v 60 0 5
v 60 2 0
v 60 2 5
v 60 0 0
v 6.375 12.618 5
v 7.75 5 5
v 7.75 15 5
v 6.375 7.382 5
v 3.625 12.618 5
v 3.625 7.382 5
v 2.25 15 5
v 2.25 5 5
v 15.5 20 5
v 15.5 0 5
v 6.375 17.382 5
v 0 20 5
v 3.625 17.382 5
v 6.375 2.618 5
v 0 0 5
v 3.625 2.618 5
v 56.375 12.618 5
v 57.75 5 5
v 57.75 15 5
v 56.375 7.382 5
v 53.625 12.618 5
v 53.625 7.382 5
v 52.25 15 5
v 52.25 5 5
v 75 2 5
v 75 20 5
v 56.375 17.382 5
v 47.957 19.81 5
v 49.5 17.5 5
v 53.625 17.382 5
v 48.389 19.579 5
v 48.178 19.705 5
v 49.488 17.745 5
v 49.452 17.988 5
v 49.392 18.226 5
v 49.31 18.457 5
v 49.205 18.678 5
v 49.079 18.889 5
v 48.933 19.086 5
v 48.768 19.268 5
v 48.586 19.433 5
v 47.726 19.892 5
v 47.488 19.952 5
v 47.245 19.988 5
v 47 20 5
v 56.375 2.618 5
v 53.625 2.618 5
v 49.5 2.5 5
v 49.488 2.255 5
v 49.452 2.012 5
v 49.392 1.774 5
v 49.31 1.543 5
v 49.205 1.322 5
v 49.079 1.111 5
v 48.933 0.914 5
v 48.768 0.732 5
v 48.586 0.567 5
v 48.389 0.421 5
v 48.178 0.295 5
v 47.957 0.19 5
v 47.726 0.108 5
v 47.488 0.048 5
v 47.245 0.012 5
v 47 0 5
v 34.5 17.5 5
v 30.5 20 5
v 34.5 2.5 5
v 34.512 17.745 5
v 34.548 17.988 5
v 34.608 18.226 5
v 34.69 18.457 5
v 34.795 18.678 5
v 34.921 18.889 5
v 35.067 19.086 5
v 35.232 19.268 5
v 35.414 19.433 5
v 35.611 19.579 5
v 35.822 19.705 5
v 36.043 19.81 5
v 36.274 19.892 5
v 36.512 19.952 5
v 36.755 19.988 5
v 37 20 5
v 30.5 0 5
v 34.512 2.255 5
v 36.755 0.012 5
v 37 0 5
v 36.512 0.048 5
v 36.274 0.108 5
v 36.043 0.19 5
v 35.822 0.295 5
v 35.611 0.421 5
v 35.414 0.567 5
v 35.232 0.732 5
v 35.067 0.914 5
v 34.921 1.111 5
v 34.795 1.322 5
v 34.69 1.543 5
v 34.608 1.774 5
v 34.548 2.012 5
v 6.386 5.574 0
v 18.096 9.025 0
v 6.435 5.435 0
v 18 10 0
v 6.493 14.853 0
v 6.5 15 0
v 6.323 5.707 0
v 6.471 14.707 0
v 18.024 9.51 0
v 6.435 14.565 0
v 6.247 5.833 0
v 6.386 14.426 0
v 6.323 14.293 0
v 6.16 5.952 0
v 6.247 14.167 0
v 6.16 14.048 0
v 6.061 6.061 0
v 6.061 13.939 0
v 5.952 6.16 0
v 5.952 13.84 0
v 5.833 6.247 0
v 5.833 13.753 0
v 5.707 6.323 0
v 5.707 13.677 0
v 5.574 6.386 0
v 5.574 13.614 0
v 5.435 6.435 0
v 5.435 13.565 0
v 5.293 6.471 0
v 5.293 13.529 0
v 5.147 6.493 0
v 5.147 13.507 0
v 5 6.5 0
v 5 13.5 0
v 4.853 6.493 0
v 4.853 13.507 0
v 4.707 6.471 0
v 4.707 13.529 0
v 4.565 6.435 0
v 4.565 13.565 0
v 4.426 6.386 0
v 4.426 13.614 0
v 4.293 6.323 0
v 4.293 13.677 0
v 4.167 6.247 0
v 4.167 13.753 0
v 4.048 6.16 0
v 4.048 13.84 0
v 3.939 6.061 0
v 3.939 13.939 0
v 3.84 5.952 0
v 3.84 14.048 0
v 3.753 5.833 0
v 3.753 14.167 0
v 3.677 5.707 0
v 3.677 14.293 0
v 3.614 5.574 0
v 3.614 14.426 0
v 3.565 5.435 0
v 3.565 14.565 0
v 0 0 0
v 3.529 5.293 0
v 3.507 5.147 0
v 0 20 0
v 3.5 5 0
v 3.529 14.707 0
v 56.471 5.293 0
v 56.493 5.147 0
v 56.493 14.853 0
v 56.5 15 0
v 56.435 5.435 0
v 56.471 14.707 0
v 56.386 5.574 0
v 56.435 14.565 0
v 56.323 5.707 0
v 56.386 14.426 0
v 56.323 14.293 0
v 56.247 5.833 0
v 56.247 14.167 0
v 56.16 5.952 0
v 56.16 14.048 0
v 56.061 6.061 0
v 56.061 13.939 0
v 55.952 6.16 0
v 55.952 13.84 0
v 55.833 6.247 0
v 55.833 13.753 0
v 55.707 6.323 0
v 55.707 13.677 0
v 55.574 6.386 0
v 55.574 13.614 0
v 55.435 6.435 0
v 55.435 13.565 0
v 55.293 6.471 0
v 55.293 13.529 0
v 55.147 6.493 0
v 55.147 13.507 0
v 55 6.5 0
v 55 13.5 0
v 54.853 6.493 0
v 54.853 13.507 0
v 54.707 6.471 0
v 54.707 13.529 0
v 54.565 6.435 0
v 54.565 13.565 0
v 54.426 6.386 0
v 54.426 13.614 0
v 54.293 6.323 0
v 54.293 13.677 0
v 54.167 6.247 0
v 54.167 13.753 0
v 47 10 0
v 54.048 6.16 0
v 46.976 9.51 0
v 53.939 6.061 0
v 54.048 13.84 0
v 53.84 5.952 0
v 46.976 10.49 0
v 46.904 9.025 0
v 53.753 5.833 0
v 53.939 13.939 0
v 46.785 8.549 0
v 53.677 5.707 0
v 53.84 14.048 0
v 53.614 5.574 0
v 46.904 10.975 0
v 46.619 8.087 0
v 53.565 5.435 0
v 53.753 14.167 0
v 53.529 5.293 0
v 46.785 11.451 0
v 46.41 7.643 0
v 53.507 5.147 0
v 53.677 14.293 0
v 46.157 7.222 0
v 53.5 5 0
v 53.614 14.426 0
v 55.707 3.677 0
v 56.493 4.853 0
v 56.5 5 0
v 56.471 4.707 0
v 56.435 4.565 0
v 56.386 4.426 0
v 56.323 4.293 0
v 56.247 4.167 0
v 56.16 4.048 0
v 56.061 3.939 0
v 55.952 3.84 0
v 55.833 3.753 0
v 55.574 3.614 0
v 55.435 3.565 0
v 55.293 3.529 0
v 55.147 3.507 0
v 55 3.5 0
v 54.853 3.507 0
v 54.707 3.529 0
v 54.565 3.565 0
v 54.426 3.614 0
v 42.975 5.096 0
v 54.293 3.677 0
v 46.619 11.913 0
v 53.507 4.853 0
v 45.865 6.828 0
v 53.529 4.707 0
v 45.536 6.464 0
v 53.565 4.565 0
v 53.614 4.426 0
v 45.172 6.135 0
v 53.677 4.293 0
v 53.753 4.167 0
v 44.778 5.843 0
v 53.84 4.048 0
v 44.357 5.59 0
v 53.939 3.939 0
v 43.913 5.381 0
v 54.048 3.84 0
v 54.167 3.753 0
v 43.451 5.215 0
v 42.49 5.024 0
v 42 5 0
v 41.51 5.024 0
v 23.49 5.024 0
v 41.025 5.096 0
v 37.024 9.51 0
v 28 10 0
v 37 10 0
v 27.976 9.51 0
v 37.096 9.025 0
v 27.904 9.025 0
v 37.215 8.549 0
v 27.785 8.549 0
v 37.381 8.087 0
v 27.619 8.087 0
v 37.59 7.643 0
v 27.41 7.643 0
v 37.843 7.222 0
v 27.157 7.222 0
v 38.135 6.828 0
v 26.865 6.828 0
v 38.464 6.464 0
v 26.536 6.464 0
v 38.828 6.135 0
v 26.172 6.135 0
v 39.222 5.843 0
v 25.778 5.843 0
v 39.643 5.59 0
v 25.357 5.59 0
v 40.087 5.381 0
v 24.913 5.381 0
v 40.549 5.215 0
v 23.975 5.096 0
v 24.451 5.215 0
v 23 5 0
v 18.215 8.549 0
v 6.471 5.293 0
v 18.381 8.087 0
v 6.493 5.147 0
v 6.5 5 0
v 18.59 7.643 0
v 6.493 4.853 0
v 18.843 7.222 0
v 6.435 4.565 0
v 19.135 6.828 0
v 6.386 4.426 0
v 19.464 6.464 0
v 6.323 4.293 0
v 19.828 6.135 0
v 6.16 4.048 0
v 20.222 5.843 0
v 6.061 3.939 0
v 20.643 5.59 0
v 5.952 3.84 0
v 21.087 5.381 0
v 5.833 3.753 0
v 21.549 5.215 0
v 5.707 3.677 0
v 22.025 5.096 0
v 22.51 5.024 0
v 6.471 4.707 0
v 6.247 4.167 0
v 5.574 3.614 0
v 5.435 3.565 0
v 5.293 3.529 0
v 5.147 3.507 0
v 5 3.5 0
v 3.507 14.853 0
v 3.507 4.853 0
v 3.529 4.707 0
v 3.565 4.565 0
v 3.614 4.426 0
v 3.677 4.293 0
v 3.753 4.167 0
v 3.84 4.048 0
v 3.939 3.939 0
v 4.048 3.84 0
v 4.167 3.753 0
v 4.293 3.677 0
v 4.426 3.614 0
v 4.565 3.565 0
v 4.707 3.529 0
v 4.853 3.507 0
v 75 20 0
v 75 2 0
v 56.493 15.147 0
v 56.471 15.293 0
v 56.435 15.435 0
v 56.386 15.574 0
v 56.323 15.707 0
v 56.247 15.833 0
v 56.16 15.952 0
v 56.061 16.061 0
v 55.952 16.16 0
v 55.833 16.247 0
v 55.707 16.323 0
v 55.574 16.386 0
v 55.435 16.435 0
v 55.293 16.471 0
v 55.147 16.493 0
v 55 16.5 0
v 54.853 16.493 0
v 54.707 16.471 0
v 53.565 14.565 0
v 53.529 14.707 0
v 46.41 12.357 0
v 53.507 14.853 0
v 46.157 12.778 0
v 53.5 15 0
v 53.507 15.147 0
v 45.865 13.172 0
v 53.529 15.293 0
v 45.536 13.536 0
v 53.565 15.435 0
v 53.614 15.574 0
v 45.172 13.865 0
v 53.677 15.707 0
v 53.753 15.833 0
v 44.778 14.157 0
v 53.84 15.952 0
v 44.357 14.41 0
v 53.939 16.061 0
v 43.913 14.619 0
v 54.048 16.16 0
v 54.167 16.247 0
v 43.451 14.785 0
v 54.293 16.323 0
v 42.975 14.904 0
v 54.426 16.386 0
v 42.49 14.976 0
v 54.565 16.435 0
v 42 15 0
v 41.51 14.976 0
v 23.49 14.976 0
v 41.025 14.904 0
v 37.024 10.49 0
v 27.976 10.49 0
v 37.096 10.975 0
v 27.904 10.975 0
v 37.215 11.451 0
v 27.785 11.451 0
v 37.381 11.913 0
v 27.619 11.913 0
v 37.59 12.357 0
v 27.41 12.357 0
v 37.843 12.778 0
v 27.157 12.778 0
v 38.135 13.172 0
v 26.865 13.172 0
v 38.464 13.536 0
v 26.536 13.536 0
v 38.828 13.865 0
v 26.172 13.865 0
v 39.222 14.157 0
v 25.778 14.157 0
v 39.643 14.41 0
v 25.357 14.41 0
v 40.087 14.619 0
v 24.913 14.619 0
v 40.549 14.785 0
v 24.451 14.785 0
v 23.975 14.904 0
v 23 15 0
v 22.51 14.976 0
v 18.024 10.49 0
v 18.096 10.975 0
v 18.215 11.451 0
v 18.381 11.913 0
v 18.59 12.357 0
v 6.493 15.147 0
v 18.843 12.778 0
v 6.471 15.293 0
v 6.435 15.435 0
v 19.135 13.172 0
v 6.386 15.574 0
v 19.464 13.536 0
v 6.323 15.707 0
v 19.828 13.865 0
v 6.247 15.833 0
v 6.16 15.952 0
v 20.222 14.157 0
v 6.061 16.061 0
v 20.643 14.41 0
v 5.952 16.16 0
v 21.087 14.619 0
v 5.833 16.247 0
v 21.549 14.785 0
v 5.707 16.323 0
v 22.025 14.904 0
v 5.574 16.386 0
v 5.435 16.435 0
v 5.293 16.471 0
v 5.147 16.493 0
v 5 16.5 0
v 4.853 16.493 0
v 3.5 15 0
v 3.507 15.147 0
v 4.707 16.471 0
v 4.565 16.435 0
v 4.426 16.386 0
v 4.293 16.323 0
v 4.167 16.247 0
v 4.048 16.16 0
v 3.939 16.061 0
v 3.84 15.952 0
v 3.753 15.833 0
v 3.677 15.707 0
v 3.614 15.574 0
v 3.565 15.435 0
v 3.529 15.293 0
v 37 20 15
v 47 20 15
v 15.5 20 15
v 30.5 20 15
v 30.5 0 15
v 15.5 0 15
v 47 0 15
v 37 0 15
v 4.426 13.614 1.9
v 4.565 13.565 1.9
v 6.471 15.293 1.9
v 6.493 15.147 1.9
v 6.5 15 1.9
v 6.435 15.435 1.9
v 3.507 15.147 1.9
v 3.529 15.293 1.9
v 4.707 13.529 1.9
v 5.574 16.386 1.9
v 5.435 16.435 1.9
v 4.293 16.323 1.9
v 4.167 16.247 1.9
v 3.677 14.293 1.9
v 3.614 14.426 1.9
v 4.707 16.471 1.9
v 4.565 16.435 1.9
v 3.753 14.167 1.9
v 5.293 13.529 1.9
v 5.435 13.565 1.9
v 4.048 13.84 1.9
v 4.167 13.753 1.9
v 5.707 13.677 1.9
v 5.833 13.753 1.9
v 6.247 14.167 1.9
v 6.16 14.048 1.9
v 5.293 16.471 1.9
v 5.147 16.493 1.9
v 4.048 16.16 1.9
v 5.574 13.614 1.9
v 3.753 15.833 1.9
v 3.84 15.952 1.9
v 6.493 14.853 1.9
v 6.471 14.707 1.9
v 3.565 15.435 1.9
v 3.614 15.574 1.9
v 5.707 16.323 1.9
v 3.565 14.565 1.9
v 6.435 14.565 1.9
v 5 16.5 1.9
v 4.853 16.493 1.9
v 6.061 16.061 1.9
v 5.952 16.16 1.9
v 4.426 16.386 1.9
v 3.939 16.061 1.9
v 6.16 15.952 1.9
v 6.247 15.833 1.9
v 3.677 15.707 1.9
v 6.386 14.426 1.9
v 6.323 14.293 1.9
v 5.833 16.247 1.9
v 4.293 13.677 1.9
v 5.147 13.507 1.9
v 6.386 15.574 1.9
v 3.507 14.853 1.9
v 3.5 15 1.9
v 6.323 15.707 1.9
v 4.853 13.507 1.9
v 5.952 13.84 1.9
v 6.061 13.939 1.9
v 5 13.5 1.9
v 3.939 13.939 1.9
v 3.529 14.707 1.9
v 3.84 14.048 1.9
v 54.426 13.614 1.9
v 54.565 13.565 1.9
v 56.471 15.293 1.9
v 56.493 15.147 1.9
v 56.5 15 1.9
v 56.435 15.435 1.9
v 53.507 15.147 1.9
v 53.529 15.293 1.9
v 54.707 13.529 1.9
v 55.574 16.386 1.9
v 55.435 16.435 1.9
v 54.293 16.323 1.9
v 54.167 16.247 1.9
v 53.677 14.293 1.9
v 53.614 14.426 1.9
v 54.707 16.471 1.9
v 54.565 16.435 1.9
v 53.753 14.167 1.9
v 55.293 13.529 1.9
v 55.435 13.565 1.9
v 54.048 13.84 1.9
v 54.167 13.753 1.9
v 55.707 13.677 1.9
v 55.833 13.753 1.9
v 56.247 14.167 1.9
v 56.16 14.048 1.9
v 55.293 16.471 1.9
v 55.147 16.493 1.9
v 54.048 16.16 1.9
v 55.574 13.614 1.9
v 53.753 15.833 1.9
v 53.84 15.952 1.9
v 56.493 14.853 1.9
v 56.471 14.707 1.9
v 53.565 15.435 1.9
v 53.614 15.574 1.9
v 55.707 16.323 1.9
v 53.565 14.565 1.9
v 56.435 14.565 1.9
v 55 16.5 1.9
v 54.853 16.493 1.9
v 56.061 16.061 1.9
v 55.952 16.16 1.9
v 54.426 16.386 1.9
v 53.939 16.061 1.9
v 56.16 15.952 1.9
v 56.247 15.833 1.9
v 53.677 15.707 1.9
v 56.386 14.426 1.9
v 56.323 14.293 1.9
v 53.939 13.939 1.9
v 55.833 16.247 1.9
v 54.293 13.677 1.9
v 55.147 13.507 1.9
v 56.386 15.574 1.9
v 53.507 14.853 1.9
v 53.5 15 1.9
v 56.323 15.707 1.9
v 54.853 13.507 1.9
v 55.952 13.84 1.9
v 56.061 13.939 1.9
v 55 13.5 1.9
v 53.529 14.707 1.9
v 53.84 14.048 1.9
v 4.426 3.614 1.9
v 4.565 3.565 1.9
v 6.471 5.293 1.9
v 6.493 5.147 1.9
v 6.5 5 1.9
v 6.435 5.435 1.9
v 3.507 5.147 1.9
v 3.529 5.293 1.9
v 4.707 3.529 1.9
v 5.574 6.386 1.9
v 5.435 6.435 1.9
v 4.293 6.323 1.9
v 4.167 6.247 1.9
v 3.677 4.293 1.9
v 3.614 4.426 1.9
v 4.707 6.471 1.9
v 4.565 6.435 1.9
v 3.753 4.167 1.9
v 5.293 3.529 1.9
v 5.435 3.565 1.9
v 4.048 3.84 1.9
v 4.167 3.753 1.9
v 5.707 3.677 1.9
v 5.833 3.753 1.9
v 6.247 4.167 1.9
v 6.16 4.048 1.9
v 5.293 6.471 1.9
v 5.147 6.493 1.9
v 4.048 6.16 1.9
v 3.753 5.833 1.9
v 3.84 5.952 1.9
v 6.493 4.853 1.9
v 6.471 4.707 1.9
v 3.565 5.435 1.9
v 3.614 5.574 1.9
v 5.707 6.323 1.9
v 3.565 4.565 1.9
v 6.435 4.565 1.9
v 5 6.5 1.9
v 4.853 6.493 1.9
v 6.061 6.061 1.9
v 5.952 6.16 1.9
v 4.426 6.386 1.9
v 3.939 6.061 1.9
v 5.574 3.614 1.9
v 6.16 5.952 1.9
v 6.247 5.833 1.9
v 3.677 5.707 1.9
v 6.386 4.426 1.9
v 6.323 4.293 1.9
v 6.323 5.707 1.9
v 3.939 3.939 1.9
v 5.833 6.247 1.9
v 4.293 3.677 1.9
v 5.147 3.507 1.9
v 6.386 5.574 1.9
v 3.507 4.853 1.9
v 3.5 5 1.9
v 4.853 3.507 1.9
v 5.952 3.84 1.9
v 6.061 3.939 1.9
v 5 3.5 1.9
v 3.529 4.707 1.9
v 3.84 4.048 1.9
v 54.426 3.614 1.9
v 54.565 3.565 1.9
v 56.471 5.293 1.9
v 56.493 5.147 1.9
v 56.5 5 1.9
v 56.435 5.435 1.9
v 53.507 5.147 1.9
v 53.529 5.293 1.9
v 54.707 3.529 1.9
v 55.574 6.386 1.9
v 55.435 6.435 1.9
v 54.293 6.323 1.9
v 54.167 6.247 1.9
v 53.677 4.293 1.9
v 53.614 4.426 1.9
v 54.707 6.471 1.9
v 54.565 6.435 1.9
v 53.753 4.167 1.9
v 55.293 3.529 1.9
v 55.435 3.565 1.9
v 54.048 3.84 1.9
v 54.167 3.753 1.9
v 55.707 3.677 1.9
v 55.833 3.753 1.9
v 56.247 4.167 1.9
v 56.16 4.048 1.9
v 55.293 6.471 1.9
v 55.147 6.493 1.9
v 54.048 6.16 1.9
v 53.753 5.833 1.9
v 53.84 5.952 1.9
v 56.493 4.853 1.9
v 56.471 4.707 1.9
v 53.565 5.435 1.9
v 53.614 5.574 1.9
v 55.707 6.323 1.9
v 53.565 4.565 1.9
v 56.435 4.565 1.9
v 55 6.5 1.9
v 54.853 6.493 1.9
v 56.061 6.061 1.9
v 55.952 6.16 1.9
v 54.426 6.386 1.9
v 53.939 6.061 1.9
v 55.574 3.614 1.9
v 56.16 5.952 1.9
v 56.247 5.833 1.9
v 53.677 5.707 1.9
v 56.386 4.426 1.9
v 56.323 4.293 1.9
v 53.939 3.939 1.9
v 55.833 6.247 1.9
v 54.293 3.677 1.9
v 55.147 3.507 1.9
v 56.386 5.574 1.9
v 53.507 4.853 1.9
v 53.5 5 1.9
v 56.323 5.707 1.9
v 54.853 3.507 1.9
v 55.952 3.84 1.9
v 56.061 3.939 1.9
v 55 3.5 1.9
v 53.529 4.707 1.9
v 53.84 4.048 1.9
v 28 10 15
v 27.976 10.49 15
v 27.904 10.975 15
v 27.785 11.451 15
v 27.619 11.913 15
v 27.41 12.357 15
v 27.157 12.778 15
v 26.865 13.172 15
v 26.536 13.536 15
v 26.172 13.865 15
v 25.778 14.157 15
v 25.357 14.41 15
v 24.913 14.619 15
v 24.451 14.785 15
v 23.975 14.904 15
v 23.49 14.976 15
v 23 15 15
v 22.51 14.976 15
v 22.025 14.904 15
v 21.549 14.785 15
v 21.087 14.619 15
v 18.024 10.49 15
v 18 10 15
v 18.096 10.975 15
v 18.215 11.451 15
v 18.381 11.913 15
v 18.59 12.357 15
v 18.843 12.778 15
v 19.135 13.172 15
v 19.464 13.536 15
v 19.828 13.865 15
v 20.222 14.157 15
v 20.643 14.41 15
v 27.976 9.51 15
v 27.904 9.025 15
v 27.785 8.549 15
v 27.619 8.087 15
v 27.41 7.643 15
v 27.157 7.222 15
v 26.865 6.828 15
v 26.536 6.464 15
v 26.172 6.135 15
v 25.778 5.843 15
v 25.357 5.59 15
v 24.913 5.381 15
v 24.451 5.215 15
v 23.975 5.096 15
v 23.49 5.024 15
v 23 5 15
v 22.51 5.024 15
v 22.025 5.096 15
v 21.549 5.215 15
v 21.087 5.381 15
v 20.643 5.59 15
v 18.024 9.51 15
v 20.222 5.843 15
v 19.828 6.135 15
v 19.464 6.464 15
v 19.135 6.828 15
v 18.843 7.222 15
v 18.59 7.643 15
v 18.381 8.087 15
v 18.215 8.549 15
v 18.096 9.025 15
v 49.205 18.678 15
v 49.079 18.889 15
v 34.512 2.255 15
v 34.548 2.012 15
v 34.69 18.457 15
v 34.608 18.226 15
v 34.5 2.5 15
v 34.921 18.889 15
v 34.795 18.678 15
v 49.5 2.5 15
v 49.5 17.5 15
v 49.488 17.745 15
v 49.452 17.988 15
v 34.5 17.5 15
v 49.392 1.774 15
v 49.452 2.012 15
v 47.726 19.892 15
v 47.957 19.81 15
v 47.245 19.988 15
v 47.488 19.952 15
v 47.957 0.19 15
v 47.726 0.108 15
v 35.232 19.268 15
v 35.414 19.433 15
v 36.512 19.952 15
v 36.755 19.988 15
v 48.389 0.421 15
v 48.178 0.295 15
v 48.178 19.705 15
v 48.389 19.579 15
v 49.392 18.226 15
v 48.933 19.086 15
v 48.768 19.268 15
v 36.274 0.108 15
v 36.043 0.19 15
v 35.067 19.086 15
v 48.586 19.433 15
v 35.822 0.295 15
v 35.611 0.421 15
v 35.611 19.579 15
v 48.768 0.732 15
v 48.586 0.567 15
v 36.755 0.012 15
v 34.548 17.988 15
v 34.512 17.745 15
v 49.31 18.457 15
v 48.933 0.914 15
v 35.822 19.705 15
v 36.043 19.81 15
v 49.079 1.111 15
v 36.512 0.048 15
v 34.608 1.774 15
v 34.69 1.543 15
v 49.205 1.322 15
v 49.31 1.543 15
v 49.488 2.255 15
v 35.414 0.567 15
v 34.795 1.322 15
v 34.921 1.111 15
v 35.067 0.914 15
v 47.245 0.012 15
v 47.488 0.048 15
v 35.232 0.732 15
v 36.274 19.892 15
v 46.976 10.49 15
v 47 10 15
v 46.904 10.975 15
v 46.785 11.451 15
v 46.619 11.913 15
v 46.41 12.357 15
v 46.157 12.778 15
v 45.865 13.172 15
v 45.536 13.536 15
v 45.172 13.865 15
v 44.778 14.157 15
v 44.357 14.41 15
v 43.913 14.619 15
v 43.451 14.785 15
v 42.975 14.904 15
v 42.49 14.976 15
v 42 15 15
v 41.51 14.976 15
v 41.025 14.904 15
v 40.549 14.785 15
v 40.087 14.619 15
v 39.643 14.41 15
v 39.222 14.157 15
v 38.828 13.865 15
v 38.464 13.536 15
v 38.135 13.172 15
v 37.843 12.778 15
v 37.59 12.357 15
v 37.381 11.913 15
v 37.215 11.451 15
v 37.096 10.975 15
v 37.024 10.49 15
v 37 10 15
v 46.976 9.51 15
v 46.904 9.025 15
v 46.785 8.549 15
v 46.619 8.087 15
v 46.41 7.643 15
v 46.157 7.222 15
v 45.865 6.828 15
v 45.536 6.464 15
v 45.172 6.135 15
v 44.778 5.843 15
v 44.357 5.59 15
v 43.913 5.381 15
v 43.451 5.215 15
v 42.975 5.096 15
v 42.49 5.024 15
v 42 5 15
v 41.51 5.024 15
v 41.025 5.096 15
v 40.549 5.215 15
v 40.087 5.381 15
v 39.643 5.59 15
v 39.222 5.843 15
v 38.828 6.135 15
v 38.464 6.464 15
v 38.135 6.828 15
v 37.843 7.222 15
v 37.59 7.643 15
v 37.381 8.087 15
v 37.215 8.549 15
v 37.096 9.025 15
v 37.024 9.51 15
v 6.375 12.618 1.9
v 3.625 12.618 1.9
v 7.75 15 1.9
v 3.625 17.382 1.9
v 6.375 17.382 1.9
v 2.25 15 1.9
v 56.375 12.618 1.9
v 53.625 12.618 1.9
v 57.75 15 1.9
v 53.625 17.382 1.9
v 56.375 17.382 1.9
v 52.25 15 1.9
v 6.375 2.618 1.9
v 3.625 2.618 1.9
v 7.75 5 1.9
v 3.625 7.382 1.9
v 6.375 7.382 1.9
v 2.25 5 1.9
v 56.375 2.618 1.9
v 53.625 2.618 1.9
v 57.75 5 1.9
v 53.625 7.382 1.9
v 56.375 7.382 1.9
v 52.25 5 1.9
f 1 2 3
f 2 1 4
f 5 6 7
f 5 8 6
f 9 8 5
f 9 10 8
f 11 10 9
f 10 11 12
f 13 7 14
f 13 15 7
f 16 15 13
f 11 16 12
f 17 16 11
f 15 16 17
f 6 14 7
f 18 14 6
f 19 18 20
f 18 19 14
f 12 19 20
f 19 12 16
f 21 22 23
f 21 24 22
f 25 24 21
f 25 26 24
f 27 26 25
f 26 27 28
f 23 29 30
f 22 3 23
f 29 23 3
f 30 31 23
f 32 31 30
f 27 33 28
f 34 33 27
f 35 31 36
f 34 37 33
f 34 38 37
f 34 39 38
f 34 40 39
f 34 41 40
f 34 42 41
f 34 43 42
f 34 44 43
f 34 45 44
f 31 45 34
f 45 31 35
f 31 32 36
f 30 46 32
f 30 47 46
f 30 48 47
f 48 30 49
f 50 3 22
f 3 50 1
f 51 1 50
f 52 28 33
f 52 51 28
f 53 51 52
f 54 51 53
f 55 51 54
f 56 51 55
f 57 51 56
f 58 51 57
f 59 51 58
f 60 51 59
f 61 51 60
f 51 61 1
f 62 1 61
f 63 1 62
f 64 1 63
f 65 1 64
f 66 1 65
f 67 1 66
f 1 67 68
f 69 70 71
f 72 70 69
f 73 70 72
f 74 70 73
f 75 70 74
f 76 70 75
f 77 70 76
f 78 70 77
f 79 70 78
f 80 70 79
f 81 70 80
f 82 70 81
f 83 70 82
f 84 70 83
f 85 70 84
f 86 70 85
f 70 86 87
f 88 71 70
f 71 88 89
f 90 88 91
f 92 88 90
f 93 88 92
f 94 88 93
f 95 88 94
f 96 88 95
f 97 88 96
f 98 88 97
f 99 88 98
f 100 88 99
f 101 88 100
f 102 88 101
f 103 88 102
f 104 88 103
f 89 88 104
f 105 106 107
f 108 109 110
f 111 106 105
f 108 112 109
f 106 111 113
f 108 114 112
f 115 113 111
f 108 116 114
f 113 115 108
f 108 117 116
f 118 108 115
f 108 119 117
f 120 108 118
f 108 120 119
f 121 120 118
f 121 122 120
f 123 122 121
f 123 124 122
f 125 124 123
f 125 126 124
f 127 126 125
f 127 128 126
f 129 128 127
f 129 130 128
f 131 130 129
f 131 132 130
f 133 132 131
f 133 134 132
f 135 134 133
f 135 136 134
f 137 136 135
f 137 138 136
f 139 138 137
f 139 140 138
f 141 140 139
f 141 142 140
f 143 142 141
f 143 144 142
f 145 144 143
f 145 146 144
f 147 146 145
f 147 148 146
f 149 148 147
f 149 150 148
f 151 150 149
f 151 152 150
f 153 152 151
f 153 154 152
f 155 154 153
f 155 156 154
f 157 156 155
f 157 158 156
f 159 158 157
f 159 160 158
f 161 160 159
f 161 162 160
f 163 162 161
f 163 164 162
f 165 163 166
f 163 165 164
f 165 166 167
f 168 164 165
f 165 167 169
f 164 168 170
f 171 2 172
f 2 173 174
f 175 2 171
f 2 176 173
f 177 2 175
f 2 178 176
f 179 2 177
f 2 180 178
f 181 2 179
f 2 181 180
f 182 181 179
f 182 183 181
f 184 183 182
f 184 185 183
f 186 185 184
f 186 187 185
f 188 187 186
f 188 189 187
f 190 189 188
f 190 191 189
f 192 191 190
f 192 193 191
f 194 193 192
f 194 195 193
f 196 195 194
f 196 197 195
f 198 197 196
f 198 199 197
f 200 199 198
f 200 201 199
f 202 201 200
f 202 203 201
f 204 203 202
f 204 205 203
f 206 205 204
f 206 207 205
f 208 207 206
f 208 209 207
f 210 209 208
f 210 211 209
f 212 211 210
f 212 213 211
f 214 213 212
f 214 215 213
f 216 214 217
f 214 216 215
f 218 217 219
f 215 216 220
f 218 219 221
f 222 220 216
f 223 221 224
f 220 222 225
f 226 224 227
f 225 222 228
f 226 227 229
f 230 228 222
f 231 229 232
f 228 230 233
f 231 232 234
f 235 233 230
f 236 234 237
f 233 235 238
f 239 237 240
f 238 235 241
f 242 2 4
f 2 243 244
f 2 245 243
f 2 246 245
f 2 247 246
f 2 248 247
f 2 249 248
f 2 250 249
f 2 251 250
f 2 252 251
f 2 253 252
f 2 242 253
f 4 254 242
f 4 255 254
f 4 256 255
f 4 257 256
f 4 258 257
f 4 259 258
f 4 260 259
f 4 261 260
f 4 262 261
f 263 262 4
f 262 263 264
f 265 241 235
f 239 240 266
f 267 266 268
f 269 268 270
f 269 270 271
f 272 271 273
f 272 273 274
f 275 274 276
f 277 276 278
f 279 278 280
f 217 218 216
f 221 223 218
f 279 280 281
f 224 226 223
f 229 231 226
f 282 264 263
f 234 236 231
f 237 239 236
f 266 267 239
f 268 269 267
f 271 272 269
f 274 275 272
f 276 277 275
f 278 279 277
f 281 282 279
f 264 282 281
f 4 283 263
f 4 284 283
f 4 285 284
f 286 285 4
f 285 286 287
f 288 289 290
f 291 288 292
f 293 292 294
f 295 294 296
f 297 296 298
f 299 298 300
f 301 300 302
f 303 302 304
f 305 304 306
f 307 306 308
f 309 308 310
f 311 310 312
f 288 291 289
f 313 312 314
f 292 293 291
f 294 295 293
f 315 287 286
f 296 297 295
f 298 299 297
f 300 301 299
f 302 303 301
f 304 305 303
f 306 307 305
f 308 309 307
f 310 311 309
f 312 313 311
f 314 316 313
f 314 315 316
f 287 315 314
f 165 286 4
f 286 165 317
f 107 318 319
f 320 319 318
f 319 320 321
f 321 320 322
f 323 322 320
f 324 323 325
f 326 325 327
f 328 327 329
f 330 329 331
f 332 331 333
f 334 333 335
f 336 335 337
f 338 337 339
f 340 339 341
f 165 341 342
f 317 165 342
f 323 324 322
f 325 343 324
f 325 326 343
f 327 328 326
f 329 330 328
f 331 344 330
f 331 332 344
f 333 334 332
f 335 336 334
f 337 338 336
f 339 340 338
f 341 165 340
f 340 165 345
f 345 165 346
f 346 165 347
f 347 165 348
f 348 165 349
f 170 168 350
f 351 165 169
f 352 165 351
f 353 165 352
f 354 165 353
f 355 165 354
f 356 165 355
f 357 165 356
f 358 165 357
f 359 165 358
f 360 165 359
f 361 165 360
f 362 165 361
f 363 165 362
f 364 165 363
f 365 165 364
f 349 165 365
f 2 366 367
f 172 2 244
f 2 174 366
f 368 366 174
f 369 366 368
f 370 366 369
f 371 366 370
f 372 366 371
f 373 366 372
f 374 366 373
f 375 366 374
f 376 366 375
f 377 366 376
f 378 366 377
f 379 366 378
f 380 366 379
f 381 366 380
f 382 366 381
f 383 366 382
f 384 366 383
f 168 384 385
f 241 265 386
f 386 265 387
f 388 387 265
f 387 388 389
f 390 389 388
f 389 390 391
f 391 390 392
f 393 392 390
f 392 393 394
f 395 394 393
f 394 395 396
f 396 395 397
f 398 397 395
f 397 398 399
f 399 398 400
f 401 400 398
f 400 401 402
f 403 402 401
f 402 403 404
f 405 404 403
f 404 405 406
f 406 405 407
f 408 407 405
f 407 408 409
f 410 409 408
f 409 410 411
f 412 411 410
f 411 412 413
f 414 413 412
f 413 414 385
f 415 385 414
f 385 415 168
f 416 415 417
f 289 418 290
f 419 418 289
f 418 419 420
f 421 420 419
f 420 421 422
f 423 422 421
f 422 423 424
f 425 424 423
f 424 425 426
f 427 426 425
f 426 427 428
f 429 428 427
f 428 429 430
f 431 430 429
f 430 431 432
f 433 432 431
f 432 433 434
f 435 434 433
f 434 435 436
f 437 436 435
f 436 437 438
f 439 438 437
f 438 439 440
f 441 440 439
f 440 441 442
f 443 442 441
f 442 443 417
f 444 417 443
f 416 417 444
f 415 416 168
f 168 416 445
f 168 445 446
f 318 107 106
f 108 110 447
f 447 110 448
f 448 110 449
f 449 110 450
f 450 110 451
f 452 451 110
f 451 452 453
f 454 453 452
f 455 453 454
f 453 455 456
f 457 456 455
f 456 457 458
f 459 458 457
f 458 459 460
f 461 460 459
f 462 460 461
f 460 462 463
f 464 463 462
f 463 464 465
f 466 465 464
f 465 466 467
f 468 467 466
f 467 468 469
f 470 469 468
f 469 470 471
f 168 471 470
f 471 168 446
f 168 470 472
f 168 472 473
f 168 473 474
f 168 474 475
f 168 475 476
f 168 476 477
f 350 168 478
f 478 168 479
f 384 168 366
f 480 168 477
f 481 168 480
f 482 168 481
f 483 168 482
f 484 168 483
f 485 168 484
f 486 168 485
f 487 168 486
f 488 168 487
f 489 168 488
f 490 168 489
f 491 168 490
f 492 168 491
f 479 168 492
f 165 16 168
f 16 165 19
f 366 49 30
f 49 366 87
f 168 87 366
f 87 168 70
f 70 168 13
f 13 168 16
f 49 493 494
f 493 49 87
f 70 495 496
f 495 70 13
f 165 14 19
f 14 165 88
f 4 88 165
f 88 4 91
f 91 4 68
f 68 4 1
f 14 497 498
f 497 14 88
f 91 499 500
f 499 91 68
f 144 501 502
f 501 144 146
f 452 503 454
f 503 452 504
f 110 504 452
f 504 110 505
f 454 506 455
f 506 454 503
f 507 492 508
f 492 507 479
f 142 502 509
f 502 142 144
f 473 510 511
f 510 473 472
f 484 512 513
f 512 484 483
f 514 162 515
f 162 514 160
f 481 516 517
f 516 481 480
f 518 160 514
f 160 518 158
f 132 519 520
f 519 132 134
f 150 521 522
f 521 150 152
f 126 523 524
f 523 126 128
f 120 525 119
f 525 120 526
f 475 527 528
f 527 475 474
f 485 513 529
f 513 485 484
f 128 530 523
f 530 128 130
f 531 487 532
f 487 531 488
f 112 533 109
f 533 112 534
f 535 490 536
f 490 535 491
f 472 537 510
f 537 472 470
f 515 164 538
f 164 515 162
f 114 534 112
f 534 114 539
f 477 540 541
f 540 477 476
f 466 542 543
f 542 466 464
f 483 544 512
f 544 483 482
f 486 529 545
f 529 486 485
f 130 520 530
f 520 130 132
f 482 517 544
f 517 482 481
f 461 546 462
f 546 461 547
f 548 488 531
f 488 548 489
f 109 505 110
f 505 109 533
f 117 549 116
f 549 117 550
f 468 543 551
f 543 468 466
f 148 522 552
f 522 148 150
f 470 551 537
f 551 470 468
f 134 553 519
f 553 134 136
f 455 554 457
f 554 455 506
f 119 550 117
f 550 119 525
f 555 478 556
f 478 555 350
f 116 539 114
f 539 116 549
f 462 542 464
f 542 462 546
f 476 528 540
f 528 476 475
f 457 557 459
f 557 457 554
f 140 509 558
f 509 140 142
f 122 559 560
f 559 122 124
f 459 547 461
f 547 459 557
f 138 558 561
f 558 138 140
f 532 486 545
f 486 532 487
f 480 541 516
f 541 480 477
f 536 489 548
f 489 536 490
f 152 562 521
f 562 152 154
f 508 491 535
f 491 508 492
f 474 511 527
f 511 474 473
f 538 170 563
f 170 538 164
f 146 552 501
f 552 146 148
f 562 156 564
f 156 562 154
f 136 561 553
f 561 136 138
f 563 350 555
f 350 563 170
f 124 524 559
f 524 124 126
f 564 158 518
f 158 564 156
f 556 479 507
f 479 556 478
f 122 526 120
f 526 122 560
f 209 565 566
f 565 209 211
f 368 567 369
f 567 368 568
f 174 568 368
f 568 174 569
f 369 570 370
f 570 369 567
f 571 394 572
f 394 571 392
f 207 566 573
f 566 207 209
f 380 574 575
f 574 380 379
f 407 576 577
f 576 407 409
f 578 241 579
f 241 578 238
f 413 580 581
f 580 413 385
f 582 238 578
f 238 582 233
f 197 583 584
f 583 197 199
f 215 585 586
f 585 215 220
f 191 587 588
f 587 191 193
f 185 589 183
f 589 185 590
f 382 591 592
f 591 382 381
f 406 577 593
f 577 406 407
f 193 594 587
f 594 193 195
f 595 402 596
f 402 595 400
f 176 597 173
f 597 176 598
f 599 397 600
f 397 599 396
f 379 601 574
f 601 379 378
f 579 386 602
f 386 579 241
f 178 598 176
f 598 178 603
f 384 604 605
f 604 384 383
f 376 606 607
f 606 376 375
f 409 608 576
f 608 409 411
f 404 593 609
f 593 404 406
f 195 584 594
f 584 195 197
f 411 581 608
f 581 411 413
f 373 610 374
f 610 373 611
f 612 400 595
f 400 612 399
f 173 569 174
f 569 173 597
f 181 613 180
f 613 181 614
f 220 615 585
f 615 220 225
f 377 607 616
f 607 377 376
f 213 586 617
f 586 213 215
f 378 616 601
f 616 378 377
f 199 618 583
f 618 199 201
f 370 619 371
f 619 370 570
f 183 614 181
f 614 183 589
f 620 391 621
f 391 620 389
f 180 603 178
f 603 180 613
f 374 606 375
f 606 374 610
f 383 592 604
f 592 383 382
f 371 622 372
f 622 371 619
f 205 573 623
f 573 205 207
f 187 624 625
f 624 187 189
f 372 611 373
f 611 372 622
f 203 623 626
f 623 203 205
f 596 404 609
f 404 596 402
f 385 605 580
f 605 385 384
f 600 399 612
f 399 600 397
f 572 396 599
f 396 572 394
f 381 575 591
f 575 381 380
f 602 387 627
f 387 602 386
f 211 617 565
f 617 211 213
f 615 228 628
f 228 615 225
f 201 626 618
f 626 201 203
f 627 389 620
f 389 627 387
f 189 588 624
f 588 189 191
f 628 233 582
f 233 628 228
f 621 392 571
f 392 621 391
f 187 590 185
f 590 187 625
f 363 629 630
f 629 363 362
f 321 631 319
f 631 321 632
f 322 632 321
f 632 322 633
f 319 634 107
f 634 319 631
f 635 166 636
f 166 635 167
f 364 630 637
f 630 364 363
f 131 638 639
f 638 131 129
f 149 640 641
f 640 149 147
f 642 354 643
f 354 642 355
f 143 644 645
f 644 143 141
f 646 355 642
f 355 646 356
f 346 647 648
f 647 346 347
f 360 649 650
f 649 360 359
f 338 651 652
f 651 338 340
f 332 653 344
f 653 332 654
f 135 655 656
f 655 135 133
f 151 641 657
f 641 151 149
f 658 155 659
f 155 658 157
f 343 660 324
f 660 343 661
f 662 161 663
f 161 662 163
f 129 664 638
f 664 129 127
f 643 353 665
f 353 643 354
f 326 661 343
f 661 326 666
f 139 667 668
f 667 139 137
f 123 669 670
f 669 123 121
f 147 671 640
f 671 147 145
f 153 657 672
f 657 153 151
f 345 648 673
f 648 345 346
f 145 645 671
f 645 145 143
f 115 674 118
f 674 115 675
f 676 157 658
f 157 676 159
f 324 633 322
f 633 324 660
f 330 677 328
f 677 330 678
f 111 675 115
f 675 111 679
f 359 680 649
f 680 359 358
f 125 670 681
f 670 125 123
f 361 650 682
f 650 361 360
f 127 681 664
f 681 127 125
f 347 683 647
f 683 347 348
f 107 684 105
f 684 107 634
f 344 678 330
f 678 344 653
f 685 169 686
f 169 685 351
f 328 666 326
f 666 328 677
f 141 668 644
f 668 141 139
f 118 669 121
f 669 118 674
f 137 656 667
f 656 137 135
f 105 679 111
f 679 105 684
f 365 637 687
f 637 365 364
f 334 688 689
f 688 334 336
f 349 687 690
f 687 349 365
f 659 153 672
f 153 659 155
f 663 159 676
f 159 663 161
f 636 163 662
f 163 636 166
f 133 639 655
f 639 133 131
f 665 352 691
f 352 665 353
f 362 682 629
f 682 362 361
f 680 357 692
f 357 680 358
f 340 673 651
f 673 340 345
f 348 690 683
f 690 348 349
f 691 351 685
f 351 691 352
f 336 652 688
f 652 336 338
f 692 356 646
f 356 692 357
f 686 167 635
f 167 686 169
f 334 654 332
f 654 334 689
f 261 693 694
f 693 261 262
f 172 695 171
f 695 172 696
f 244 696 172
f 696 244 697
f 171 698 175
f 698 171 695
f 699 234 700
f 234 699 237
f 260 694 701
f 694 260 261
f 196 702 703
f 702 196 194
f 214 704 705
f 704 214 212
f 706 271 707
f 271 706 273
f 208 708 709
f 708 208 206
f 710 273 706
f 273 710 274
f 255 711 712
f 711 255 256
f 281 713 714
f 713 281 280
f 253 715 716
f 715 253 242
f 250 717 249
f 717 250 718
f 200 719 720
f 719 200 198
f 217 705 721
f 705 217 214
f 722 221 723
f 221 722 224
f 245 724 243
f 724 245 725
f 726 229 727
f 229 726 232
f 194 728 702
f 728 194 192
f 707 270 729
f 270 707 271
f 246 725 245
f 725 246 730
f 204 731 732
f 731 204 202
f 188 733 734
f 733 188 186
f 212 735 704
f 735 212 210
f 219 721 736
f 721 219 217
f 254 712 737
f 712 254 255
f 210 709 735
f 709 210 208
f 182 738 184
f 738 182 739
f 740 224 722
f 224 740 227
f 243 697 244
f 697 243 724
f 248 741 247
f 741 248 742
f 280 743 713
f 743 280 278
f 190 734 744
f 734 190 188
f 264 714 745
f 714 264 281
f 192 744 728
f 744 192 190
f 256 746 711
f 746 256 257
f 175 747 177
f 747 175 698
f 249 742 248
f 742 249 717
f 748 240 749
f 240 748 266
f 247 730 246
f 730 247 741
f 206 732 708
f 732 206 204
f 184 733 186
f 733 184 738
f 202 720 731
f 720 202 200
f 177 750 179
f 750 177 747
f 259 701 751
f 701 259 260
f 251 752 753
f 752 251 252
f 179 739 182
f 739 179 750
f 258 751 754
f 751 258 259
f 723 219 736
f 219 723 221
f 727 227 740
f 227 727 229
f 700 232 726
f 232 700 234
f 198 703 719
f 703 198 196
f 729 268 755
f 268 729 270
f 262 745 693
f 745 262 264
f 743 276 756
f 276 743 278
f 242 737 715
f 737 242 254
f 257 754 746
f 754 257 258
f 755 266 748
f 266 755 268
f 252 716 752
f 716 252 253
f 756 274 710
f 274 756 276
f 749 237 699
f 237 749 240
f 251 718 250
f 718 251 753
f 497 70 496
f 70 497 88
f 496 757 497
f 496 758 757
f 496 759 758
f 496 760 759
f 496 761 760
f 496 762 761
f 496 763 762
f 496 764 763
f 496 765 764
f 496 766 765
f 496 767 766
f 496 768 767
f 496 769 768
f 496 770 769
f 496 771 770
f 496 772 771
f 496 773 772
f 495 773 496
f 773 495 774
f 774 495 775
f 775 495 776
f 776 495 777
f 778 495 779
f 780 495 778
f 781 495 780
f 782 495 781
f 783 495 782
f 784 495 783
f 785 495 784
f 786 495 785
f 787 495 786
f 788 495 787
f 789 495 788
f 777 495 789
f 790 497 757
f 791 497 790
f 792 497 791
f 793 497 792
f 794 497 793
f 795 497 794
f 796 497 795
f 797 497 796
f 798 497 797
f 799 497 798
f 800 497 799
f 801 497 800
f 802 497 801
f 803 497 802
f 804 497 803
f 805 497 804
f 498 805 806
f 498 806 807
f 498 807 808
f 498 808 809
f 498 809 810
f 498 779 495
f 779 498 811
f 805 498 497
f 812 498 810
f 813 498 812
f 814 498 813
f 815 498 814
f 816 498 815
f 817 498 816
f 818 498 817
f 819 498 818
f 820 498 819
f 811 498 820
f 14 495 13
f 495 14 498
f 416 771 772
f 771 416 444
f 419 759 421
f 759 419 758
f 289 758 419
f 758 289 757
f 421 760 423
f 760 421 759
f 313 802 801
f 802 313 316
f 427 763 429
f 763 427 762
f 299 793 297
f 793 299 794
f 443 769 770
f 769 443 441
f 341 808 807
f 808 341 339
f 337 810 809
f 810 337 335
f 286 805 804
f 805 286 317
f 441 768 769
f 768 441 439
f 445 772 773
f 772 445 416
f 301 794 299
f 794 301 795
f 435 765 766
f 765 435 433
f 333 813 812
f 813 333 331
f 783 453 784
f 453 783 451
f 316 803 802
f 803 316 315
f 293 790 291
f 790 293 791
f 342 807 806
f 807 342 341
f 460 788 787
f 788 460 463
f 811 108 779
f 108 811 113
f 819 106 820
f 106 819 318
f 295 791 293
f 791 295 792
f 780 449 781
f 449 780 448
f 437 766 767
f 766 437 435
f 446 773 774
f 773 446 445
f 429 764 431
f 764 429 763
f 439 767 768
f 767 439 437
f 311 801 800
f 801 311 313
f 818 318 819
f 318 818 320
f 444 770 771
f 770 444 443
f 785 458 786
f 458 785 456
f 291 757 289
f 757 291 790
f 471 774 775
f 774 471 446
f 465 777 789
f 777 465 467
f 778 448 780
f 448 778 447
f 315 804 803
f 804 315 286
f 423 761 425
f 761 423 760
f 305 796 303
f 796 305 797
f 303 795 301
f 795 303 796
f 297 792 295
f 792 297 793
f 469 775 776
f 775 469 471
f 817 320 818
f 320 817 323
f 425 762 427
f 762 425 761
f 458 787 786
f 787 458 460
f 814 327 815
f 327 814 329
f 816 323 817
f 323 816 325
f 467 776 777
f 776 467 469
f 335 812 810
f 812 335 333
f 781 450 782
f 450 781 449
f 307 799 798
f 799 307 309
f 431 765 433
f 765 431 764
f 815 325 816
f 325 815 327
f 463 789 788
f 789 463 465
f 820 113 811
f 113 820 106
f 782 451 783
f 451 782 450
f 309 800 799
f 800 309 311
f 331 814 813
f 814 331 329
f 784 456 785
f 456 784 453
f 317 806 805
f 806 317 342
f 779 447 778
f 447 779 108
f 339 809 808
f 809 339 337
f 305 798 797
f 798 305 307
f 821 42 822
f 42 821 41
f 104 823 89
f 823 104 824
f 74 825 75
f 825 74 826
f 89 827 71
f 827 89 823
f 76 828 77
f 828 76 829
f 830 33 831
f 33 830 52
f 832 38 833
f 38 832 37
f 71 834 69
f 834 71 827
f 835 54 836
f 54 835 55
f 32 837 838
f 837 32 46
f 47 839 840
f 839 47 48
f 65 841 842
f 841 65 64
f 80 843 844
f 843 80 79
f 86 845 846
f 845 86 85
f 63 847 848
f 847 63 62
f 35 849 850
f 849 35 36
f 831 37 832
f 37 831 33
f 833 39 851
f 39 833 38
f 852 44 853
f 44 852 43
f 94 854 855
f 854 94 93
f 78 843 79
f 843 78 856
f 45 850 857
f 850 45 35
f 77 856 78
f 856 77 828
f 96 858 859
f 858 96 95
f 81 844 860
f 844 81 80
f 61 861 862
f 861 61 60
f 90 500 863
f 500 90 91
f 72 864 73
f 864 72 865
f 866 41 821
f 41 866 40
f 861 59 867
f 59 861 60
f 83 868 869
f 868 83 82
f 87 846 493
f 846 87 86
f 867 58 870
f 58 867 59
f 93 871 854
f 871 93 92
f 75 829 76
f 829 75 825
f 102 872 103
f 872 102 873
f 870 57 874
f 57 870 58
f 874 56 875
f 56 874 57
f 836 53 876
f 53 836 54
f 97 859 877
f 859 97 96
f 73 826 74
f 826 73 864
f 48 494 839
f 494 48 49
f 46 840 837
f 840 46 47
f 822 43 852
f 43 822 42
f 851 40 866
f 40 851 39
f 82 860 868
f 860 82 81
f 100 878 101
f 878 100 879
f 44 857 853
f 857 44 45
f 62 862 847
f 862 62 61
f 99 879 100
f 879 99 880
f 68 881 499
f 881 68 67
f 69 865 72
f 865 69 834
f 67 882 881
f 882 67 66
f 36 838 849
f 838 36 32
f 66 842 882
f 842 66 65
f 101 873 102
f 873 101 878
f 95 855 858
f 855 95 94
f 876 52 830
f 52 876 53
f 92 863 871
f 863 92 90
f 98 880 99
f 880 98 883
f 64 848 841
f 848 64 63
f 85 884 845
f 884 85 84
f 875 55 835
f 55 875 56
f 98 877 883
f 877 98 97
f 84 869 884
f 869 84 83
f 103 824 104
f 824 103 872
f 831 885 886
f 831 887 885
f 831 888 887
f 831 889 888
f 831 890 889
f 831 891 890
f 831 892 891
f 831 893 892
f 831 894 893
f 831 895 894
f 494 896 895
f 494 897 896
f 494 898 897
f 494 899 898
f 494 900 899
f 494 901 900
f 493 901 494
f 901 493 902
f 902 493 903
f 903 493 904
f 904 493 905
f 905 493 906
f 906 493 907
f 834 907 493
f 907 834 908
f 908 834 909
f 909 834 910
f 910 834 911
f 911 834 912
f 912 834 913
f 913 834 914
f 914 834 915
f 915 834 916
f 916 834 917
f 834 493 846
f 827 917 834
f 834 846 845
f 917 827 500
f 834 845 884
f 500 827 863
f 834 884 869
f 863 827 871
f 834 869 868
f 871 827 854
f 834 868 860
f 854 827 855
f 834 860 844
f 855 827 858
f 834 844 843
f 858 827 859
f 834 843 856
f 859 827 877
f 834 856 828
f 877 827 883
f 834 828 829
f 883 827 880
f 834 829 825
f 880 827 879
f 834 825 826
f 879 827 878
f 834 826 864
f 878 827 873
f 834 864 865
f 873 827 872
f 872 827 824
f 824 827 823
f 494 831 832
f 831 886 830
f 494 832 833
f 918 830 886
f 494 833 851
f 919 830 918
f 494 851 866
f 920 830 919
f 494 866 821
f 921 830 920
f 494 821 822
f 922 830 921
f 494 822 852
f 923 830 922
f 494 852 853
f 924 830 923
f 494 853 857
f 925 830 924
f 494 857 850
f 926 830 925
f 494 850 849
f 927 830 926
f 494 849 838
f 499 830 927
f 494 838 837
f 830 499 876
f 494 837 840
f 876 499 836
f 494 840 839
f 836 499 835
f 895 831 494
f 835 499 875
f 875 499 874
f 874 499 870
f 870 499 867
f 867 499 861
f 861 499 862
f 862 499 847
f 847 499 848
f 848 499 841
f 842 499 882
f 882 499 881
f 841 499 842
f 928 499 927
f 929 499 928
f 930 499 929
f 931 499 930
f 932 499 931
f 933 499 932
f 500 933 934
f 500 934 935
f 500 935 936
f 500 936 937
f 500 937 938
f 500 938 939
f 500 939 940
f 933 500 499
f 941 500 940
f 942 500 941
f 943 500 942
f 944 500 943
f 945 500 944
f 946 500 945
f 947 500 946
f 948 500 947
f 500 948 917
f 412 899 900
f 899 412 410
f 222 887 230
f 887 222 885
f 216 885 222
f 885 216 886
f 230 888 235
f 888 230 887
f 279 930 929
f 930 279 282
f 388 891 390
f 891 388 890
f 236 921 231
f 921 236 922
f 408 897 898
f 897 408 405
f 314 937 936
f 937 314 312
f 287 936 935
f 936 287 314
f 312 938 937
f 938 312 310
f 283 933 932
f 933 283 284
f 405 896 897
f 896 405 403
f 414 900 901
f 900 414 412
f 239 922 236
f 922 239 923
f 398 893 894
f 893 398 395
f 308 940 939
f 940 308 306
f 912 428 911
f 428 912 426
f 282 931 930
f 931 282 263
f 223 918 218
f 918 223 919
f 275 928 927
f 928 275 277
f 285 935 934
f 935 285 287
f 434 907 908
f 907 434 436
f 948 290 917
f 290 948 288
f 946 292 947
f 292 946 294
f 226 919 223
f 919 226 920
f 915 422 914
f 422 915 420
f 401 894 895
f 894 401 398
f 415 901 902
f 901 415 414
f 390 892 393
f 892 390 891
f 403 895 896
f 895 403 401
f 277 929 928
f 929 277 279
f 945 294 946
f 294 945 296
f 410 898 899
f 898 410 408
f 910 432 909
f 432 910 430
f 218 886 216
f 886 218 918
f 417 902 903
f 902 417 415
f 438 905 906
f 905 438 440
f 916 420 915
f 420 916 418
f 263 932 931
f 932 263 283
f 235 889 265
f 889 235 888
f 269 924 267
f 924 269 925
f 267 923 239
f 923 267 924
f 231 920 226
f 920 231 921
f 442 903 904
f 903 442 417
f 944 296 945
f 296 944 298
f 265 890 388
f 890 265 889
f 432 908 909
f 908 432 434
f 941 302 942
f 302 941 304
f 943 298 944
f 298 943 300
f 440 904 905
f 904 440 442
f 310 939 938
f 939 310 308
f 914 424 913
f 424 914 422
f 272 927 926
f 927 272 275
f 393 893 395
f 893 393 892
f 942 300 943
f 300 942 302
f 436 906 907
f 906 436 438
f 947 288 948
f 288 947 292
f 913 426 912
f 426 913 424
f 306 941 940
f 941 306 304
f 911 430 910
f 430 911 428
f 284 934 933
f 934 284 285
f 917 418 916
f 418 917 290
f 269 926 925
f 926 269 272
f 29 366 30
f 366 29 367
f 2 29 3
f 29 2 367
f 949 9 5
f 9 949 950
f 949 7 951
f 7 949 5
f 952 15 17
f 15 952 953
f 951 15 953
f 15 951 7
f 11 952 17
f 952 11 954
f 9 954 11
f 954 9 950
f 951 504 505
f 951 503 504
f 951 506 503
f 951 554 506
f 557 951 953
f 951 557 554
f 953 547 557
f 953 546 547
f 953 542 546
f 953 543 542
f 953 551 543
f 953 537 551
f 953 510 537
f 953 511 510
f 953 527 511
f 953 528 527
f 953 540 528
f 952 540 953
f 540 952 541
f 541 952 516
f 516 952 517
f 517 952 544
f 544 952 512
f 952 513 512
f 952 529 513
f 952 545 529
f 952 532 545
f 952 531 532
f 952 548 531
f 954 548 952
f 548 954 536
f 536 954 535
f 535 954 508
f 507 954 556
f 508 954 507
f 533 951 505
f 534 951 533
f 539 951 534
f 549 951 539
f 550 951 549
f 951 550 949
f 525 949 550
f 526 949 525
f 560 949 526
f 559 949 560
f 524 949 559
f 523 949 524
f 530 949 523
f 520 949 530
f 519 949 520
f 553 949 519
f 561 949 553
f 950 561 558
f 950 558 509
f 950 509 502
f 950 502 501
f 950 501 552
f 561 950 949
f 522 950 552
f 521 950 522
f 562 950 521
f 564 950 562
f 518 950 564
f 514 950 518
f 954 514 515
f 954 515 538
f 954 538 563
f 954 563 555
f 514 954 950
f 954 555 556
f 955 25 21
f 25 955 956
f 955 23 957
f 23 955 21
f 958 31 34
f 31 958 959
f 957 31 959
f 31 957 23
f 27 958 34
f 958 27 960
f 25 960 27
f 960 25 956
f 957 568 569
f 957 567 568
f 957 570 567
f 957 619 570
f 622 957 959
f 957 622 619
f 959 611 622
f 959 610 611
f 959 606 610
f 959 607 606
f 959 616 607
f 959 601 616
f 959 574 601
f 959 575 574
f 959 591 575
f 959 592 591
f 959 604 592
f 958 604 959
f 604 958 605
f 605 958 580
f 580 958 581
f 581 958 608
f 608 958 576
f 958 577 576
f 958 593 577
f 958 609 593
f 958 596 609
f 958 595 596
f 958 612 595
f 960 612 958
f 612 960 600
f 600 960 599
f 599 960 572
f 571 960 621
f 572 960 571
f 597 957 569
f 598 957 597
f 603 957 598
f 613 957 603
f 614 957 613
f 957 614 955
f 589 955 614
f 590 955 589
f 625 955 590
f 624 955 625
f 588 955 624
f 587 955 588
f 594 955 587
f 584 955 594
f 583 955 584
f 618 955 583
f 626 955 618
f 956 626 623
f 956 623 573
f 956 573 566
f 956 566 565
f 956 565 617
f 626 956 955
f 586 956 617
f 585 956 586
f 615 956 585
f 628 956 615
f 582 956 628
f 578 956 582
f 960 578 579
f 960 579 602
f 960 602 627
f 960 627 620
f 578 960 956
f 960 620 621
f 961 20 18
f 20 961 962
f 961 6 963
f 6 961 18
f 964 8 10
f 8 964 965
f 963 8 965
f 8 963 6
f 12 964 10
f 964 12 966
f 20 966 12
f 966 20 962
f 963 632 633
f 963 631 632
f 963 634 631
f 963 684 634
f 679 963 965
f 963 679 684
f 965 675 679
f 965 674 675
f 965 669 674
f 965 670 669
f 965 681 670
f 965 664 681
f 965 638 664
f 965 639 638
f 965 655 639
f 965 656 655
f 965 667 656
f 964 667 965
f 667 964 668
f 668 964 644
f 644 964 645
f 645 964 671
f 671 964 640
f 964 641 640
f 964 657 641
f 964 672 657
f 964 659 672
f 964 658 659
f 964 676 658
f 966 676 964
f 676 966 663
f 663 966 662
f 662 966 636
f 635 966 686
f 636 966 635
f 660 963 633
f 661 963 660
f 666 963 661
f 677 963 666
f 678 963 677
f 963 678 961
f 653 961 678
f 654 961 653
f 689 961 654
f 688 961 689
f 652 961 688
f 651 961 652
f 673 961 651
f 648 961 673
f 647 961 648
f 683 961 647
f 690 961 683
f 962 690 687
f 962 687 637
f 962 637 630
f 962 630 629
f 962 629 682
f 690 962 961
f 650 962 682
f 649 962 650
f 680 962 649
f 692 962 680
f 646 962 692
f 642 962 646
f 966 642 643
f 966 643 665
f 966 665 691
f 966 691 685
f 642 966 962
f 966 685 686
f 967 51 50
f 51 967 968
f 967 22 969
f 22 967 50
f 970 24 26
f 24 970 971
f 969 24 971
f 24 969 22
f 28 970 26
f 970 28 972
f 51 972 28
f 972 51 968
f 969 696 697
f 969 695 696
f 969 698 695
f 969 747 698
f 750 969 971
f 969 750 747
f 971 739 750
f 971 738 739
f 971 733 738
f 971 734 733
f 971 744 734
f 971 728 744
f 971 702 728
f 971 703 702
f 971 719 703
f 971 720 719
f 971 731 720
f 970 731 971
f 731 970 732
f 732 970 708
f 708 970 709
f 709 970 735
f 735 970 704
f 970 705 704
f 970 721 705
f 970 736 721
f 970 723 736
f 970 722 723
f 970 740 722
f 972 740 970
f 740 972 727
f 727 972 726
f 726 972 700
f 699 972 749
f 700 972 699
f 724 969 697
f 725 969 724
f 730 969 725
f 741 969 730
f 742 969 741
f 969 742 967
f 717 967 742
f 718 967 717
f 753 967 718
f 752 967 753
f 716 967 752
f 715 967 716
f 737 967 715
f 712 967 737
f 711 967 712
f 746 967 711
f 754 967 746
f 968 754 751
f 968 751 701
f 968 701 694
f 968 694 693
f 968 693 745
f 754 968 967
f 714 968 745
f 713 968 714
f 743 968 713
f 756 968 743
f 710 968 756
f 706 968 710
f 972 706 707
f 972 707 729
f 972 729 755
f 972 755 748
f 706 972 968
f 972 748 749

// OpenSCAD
module TestModule(){
  difference(){
    cube([60, 20, 5]);
    translate([23, 10, -0.1])cylinder(d=10,h=5.2,$fn=64);
    translate([42, 10, -0.1])cylinder(d=10,h=5.2,$fn=64);
    translate([5, 15, -0.1])cylinder(d=3,h=5.2,$fn=64);
    translate([55, 15, -0.1])cylinder(d=3,h=5.2,$fn=64);
    translate([5, 5, -0.1])cylinder(d=3,h=5.2,$fn=64);
    translate([55, 5, -0.1])cylinder(d=3,h=5.2,$fn=64);
  }
}
module Anchor3(){
  translate([55, 5, 2])difference(){
      translate([-50, 0, 0])difference(){
          translate([50, 10, 0])difference(){
              translate([-50, 0, 0])difference(){
                  translate([55, -13, -2])union(){
                      translate([-18, 8, 0])difference(){
                          union(){
                            translate([-19, 0, 0])difference(){
                                union(){
                                  translate([-23, -10, 0])color("lightblue")TestModule();
                                  translate([-7.5, -10, 0])color("navy")cube([15, 20, 15]);
                                }

                                translate([0, 0, -0.1])color("Aquamarine")cylinder(d=10,h=15.2,$fn=64);
                              }

                            translate([-7.5, -10, 0])color("purple")union()linear_extrude(height=15)translate([2.5, 2.5, 0])hull(){
                                        circle(d=5,$fn=64);
                                        translate([10, 0, 0])circle(d=5,$fn=64);
                                        translate([0, 15, 0])circle(d=5,$fn=64);
                                        translate([10, 15, 0])circle(d=5,$fn=64);
                                      }

                          }

                          translate([0, 0, -0.1])color("Aquamarine")cylinder(d=10,h=15.2,$fn=64);
                        }

                      color("gold")cube([15, 18, 5]);
                    }

                  translate([0, 0, -0.1])color("Aquamarine")cylinder(d=5.5,h=15.2,$fn=6);
                }

              translate([0, 0, -0.1])color("Aquamarine")cylinder(d=5.5,h=15.2,$fn=6);
            }

          translate([0, 0, -0.1])color("Aquamarine")cylinder(d=5.5,h=15.2,$fn=6);
        }

      translate([0, 0, -0.1])color("Aquamarine")cylinder(d=5.5,h=15.2,$fn=6);
    }
}
$fn=64;
Anchor3();
